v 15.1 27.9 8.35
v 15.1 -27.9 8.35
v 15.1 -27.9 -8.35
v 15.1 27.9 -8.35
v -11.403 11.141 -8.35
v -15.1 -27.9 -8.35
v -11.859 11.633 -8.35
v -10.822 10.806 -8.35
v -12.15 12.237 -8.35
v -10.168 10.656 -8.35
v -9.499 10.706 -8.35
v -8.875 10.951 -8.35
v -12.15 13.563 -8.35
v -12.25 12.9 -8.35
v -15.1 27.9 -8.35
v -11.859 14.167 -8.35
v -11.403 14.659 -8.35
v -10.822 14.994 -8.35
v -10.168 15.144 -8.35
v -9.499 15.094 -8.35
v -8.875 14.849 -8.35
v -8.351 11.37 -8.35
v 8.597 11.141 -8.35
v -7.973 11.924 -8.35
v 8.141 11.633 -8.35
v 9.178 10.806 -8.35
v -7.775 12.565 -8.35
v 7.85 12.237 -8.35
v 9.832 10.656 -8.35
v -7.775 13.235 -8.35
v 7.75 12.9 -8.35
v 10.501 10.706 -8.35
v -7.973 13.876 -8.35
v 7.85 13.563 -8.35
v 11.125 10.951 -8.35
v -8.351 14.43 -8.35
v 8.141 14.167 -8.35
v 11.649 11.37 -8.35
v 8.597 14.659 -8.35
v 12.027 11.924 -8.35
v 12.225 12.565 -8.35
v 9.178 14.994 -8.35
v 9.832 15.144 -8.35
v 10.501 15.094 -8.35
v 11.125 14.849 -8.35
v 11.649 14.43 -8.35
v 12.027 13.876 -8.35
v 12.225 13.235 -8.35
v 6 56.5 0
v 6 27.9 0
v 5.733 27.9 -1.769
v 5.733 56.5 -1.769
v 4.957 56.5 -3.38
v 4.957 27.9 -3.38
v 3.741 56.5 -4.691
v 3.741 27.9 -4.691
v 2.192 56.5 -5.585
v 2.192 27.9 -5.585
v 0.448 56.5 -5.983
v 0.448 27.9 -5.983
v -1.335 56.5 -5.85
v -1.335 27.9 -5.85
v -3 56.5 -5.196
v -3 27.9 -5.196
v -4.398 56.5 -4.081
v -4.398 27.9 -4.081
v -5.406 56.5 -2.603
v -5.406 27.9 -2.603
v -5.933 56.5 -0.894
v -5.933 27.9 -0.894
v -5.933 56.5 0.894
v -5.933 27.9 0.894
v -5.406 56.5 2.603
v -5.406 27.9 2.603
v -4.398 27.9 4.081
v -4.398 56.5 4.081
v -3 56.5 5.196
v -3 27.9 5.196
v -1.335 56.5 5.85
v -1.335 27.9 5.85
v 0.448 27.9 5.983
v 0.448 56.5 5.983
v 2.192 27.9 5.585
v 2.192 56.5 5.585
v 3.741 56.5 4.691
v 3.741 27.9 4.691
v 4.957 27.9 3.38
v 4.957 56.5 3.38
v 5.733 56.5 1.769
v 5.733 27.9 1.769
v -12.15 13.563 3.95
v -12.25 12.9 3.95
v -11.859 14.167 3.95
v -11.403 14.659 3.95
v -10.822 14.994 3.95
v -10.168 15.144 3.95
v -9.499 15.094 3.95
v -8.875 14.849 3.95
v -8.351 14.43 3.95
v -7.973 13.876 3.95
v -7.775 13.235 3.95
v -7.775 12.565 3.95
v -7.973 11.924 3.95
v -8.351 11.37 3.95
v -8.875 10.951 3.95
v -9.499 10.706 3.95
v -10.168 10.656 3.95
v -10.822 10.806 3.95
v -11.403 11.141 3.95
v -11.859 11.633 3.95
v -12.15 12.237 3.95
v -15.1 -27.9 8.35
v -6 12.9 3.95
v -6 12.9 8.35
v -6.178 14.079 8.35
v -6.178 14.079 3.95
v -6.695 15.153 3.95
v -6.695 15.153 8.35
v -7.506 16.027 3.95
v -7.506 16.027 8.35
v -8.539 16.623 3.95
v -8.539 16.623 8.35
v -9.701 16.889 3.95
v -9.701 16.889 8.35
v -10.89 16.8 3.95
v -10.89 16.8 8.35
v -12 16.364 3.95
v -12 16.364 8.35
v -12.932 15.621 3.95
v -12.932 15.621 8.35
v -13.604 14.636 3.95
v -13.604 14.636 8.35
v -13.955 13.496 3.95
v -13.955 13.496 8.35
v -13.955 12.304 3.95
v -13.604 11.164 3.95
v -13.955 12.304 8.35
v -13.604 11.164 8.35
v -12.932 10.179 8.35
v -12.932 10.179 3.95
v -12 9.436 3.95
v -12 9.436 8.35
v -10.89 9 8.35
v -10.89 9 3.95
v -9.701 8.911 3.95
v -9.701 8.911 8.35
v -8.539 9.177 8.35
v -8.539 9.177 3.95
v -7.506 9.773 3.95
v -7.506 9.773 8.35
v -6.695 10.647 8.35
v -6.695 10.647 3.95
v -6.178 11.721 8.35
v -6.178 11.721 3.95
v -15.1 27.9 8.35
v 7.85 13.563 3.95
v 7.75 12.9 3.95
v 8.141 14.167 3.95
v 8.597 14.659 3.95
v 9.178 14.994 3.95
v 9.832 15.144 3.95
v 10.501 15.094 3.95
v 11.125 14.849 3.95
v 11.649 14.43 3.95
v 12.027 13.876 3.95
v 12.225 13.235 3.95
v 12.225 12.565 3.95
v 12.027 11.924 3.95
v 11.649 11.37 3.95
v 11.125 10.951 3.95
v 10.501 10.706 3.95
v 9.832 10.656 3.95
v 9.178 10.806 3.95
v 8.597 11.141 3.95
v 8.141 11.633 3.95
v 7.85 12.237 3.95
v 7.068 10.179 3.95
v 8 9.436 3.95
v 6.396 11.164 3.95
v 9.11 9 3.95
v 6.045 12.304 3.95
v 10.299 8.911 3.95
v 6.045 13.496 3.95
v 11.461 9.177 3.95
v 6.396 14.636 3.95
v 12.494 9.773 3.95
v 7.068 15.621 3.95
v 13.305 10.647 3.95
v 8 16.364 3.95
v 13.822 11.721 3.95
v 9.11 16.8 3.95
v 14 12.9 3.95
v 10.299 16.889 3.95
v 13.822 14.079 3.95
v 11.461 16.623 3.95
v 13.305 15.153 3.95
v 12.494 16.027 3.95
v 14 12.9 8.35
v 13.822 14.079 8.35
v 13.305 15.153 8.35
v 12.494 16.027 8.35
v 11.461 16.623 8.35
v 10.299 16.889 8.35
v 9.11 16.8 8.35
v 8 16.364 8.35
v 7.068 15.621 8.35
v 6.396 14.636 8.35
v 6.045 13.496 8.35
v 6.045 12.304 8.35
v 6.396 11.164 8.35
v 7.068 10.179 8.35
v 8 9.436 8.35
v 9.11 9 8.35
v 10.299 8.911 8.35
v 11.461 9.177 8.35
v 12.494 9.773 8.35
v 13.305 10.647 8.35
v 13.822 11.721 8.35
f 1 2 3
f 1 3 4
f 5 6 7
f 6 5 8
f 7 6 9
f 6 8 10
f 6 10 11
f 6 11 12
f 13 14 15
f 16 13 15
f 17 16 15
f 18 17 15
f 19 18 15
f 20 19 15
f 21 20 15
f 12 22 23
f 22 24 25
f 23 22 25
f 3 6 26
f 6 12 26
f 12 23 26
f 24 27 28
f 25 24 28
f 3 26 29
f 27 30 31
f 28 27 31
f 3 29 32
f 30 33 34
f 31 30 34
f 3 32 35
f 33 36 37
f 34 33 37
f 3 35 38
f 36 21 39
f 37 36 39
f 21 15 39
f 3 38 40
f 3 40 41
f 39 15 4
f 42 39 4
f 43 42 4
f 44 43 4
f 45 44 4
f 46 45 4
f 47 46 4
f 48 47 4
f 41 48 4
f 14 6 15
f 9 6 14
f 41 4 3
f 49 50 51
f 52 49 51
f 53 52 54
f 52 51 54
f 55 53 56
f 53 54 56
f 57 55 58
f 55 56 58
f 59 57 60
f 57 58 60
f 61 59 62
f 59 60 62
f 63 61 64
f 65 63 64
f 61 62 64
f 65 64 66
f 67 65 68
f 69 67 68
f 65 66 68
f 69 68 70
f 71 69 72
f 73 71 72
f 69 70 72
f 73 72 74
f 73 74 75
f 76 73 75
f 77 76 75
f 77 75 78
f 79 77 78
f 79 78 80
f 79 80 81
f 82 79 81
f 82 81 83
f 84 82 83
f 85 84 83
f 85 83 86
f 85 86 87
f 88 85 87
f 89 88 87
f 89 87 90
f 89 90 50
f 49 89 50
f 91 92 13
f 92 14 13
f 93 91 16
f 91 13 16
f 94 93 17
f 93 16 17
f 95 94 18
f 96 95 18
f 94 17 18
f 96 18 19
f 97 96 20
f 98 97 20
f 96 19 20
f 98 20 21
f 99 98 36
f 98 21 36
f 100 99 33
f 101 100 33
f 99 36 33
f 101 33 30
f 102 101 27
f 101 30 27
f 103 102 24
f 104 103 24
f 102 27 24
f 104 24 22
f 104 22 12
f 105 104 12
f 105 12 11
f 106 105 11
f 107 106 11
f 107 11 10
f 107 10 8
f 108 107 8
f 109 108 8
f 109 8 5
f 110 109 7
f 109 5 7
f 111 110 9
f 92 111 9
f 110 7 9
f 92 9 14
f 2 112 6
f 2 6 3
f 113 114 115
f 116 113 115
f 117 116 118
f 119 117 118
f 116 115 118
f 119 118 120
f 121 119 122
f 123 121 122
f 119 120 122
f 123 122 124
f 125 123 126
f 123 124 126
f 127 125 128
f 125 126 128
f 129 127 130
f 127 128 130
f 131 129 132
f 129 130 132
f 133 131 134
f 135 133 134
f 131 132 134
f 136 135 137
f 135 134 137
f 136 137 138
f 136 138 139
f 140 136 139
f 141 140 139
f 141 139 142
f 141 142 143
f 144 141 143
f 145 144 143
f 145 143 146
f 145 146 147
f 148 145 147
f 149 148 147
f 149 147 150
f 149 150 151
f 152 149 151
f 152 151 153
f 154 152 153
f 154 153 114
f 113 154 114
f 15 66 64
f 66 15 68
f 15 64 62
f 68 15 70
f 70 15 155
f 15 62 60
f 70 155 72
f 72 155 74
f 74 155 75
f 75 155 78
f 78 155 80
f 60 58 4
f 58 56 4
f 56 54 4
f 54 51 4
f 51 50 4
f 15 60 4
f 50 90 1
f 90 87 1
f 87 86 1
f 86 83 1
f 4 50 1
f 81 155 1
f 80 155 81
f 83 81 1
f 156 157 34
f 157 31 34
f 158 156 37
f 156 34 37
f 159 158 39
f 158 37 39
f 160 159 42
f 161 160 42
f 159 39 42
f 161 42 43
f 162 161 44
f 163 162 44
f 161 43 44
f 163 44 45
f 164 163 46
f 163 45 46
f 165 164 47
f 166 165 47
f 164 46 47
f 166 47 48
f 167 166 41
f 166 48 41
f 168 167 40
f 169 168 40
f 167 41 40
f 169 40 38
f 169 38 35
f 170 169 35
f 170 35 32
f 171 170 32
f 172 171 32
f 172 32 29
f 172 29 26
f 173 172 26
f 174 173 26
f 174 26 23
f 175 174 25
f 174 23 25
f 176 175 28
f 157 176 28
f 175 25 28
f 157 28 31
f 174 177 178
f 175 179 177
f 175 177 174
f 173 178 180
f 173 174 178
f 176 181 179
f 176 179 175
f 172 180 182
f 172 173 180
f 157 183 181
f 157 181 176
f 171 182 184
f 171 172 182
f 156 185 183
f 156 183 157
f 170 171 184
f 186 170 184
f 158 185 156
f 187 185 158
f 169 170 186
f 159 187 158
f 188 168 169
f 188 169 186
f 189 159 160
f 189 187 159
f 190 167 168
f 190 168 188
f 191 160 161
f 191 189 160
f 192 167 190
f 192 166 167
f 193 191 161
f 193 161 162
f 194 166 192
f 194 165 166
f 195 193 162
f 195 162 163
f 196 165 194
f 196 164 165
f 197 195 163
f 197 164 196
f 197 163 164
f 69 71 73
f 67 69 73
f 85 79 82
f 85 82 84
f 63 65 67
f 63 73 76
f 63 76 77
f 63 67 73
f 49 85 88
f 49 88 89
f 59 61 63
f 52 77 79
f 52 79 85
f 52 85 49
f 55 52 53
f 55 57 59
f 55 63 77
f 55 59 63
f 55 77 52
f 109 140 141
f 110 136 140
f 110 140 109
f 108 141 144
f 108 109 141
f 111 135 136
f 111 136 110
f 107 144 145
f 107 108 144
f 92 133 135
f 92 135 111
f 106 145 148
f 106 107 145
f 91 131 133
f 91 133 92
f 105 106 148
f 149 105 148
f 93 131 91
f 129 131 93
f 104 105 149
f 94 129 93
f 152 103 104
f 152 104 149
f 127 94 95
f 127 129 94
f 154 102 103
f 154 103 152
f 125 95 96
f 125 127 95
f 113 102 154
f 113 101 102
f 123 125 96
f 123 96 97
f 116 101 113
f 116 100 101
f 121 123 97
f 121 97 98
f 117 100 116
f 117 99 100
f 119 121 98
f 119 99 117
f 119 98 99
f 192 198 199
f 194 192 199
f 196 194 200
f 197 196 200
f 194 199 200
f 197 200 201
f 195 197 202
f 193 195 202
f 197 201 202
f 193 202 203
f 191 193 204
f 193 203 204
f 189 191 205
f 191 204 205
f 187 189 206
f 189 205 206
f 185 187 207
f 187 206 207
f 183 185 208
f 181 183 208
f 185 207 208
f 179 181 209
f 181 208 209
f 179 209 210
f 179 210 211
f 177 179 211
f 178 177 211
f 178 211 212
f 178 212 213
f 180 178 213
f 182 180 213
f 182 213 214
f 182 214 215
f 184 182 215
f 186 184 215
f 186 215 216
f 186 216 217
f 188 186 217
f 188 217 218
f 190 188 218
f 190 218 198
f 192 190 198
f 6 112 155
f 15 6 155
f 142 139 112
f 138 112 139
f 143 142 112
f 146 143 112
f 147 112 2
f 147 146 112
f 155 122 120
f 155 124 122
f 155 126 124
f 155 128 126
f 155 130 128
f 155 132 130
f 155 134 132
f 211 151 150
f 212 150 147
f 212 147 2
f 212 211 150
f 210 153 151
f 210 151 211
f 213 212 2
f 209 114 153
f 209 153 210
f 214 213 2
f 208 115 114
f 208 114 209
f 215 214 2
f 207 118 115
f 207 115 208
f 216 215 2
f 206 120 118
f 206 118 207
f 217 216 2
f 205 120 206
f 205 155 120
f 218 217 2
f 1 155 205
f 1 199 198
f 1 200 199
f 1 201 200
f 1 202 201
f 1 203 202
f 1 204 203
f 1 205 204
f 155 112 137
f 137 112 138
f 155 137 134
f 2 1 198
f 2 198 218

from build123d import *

# Parameters (mm, degrees)
SKETCH1_W                                           = 30.2
SKETCH1_H                                           = 55.8
BOSS_EXTRUDE1_DEPTH                                 = 8.35
CBORE_FOR_M4_HEX_SOCKET_HEAD_CAP_SCREW1_D           = 4.5
CBORE_FOR_M4_HEX_SOCKET_HEAD_CAP_SCREW1_CBORE_D     = 8
CBORE_FOR_M4_HEX_SOCKET_HEAD_CAP_SCREW1_CBORE_DEPTH = 4.4
BOSS_EXTRUDE2_START                                 = -15
SKETCH4_R                                           = 6
BOSS_EXTRUDE2_DEPTH                                 = 43.6


with BuildPart() as part:
    # Sketch1 → Boss-Extrude1 (new body, symmetric)
    with BuildSketch(Plane.XY):
        Rectangle(SKETCH1_W, SKETCH1_H)
    extrude(amount=BOSS_EXTRUDE1_DEPTH, both=True)

    # CBORE for M4 Hex Socket Head Cap Screw1 (through all)
    with Locations(Plane.XY.offset(8.35)):
        with Locations((-10, 12.9), (10, 12.9)):
            CounterBoreHole(CBORE_FOR_M4_HEX_SOCKET_HEAD_CAP_SCREW1_D / 2, CBORE_FOR_M4_HEX_SOCKET_HEAD_CAP_SCREW1_CBORE_D / 2, CBORE_FOR_M4_HEX_SOCKET_HEAD_CAP_SCREW1_CBORE_DEPTH)

    # Sketch4 → Boss-Extrude2 (add)
    with BuildSketch(Plane(origin=(0, 27.9, 0), x_dir=(1, 0, 0), z_dir=(0, 1, 0)).offset(BOSS_EXTRUDE2_START)):
        Circle(SKETCH4_R)
    extrude(amount=BOSS_EXTRUDE2_DEPTH)


solid = part.part
